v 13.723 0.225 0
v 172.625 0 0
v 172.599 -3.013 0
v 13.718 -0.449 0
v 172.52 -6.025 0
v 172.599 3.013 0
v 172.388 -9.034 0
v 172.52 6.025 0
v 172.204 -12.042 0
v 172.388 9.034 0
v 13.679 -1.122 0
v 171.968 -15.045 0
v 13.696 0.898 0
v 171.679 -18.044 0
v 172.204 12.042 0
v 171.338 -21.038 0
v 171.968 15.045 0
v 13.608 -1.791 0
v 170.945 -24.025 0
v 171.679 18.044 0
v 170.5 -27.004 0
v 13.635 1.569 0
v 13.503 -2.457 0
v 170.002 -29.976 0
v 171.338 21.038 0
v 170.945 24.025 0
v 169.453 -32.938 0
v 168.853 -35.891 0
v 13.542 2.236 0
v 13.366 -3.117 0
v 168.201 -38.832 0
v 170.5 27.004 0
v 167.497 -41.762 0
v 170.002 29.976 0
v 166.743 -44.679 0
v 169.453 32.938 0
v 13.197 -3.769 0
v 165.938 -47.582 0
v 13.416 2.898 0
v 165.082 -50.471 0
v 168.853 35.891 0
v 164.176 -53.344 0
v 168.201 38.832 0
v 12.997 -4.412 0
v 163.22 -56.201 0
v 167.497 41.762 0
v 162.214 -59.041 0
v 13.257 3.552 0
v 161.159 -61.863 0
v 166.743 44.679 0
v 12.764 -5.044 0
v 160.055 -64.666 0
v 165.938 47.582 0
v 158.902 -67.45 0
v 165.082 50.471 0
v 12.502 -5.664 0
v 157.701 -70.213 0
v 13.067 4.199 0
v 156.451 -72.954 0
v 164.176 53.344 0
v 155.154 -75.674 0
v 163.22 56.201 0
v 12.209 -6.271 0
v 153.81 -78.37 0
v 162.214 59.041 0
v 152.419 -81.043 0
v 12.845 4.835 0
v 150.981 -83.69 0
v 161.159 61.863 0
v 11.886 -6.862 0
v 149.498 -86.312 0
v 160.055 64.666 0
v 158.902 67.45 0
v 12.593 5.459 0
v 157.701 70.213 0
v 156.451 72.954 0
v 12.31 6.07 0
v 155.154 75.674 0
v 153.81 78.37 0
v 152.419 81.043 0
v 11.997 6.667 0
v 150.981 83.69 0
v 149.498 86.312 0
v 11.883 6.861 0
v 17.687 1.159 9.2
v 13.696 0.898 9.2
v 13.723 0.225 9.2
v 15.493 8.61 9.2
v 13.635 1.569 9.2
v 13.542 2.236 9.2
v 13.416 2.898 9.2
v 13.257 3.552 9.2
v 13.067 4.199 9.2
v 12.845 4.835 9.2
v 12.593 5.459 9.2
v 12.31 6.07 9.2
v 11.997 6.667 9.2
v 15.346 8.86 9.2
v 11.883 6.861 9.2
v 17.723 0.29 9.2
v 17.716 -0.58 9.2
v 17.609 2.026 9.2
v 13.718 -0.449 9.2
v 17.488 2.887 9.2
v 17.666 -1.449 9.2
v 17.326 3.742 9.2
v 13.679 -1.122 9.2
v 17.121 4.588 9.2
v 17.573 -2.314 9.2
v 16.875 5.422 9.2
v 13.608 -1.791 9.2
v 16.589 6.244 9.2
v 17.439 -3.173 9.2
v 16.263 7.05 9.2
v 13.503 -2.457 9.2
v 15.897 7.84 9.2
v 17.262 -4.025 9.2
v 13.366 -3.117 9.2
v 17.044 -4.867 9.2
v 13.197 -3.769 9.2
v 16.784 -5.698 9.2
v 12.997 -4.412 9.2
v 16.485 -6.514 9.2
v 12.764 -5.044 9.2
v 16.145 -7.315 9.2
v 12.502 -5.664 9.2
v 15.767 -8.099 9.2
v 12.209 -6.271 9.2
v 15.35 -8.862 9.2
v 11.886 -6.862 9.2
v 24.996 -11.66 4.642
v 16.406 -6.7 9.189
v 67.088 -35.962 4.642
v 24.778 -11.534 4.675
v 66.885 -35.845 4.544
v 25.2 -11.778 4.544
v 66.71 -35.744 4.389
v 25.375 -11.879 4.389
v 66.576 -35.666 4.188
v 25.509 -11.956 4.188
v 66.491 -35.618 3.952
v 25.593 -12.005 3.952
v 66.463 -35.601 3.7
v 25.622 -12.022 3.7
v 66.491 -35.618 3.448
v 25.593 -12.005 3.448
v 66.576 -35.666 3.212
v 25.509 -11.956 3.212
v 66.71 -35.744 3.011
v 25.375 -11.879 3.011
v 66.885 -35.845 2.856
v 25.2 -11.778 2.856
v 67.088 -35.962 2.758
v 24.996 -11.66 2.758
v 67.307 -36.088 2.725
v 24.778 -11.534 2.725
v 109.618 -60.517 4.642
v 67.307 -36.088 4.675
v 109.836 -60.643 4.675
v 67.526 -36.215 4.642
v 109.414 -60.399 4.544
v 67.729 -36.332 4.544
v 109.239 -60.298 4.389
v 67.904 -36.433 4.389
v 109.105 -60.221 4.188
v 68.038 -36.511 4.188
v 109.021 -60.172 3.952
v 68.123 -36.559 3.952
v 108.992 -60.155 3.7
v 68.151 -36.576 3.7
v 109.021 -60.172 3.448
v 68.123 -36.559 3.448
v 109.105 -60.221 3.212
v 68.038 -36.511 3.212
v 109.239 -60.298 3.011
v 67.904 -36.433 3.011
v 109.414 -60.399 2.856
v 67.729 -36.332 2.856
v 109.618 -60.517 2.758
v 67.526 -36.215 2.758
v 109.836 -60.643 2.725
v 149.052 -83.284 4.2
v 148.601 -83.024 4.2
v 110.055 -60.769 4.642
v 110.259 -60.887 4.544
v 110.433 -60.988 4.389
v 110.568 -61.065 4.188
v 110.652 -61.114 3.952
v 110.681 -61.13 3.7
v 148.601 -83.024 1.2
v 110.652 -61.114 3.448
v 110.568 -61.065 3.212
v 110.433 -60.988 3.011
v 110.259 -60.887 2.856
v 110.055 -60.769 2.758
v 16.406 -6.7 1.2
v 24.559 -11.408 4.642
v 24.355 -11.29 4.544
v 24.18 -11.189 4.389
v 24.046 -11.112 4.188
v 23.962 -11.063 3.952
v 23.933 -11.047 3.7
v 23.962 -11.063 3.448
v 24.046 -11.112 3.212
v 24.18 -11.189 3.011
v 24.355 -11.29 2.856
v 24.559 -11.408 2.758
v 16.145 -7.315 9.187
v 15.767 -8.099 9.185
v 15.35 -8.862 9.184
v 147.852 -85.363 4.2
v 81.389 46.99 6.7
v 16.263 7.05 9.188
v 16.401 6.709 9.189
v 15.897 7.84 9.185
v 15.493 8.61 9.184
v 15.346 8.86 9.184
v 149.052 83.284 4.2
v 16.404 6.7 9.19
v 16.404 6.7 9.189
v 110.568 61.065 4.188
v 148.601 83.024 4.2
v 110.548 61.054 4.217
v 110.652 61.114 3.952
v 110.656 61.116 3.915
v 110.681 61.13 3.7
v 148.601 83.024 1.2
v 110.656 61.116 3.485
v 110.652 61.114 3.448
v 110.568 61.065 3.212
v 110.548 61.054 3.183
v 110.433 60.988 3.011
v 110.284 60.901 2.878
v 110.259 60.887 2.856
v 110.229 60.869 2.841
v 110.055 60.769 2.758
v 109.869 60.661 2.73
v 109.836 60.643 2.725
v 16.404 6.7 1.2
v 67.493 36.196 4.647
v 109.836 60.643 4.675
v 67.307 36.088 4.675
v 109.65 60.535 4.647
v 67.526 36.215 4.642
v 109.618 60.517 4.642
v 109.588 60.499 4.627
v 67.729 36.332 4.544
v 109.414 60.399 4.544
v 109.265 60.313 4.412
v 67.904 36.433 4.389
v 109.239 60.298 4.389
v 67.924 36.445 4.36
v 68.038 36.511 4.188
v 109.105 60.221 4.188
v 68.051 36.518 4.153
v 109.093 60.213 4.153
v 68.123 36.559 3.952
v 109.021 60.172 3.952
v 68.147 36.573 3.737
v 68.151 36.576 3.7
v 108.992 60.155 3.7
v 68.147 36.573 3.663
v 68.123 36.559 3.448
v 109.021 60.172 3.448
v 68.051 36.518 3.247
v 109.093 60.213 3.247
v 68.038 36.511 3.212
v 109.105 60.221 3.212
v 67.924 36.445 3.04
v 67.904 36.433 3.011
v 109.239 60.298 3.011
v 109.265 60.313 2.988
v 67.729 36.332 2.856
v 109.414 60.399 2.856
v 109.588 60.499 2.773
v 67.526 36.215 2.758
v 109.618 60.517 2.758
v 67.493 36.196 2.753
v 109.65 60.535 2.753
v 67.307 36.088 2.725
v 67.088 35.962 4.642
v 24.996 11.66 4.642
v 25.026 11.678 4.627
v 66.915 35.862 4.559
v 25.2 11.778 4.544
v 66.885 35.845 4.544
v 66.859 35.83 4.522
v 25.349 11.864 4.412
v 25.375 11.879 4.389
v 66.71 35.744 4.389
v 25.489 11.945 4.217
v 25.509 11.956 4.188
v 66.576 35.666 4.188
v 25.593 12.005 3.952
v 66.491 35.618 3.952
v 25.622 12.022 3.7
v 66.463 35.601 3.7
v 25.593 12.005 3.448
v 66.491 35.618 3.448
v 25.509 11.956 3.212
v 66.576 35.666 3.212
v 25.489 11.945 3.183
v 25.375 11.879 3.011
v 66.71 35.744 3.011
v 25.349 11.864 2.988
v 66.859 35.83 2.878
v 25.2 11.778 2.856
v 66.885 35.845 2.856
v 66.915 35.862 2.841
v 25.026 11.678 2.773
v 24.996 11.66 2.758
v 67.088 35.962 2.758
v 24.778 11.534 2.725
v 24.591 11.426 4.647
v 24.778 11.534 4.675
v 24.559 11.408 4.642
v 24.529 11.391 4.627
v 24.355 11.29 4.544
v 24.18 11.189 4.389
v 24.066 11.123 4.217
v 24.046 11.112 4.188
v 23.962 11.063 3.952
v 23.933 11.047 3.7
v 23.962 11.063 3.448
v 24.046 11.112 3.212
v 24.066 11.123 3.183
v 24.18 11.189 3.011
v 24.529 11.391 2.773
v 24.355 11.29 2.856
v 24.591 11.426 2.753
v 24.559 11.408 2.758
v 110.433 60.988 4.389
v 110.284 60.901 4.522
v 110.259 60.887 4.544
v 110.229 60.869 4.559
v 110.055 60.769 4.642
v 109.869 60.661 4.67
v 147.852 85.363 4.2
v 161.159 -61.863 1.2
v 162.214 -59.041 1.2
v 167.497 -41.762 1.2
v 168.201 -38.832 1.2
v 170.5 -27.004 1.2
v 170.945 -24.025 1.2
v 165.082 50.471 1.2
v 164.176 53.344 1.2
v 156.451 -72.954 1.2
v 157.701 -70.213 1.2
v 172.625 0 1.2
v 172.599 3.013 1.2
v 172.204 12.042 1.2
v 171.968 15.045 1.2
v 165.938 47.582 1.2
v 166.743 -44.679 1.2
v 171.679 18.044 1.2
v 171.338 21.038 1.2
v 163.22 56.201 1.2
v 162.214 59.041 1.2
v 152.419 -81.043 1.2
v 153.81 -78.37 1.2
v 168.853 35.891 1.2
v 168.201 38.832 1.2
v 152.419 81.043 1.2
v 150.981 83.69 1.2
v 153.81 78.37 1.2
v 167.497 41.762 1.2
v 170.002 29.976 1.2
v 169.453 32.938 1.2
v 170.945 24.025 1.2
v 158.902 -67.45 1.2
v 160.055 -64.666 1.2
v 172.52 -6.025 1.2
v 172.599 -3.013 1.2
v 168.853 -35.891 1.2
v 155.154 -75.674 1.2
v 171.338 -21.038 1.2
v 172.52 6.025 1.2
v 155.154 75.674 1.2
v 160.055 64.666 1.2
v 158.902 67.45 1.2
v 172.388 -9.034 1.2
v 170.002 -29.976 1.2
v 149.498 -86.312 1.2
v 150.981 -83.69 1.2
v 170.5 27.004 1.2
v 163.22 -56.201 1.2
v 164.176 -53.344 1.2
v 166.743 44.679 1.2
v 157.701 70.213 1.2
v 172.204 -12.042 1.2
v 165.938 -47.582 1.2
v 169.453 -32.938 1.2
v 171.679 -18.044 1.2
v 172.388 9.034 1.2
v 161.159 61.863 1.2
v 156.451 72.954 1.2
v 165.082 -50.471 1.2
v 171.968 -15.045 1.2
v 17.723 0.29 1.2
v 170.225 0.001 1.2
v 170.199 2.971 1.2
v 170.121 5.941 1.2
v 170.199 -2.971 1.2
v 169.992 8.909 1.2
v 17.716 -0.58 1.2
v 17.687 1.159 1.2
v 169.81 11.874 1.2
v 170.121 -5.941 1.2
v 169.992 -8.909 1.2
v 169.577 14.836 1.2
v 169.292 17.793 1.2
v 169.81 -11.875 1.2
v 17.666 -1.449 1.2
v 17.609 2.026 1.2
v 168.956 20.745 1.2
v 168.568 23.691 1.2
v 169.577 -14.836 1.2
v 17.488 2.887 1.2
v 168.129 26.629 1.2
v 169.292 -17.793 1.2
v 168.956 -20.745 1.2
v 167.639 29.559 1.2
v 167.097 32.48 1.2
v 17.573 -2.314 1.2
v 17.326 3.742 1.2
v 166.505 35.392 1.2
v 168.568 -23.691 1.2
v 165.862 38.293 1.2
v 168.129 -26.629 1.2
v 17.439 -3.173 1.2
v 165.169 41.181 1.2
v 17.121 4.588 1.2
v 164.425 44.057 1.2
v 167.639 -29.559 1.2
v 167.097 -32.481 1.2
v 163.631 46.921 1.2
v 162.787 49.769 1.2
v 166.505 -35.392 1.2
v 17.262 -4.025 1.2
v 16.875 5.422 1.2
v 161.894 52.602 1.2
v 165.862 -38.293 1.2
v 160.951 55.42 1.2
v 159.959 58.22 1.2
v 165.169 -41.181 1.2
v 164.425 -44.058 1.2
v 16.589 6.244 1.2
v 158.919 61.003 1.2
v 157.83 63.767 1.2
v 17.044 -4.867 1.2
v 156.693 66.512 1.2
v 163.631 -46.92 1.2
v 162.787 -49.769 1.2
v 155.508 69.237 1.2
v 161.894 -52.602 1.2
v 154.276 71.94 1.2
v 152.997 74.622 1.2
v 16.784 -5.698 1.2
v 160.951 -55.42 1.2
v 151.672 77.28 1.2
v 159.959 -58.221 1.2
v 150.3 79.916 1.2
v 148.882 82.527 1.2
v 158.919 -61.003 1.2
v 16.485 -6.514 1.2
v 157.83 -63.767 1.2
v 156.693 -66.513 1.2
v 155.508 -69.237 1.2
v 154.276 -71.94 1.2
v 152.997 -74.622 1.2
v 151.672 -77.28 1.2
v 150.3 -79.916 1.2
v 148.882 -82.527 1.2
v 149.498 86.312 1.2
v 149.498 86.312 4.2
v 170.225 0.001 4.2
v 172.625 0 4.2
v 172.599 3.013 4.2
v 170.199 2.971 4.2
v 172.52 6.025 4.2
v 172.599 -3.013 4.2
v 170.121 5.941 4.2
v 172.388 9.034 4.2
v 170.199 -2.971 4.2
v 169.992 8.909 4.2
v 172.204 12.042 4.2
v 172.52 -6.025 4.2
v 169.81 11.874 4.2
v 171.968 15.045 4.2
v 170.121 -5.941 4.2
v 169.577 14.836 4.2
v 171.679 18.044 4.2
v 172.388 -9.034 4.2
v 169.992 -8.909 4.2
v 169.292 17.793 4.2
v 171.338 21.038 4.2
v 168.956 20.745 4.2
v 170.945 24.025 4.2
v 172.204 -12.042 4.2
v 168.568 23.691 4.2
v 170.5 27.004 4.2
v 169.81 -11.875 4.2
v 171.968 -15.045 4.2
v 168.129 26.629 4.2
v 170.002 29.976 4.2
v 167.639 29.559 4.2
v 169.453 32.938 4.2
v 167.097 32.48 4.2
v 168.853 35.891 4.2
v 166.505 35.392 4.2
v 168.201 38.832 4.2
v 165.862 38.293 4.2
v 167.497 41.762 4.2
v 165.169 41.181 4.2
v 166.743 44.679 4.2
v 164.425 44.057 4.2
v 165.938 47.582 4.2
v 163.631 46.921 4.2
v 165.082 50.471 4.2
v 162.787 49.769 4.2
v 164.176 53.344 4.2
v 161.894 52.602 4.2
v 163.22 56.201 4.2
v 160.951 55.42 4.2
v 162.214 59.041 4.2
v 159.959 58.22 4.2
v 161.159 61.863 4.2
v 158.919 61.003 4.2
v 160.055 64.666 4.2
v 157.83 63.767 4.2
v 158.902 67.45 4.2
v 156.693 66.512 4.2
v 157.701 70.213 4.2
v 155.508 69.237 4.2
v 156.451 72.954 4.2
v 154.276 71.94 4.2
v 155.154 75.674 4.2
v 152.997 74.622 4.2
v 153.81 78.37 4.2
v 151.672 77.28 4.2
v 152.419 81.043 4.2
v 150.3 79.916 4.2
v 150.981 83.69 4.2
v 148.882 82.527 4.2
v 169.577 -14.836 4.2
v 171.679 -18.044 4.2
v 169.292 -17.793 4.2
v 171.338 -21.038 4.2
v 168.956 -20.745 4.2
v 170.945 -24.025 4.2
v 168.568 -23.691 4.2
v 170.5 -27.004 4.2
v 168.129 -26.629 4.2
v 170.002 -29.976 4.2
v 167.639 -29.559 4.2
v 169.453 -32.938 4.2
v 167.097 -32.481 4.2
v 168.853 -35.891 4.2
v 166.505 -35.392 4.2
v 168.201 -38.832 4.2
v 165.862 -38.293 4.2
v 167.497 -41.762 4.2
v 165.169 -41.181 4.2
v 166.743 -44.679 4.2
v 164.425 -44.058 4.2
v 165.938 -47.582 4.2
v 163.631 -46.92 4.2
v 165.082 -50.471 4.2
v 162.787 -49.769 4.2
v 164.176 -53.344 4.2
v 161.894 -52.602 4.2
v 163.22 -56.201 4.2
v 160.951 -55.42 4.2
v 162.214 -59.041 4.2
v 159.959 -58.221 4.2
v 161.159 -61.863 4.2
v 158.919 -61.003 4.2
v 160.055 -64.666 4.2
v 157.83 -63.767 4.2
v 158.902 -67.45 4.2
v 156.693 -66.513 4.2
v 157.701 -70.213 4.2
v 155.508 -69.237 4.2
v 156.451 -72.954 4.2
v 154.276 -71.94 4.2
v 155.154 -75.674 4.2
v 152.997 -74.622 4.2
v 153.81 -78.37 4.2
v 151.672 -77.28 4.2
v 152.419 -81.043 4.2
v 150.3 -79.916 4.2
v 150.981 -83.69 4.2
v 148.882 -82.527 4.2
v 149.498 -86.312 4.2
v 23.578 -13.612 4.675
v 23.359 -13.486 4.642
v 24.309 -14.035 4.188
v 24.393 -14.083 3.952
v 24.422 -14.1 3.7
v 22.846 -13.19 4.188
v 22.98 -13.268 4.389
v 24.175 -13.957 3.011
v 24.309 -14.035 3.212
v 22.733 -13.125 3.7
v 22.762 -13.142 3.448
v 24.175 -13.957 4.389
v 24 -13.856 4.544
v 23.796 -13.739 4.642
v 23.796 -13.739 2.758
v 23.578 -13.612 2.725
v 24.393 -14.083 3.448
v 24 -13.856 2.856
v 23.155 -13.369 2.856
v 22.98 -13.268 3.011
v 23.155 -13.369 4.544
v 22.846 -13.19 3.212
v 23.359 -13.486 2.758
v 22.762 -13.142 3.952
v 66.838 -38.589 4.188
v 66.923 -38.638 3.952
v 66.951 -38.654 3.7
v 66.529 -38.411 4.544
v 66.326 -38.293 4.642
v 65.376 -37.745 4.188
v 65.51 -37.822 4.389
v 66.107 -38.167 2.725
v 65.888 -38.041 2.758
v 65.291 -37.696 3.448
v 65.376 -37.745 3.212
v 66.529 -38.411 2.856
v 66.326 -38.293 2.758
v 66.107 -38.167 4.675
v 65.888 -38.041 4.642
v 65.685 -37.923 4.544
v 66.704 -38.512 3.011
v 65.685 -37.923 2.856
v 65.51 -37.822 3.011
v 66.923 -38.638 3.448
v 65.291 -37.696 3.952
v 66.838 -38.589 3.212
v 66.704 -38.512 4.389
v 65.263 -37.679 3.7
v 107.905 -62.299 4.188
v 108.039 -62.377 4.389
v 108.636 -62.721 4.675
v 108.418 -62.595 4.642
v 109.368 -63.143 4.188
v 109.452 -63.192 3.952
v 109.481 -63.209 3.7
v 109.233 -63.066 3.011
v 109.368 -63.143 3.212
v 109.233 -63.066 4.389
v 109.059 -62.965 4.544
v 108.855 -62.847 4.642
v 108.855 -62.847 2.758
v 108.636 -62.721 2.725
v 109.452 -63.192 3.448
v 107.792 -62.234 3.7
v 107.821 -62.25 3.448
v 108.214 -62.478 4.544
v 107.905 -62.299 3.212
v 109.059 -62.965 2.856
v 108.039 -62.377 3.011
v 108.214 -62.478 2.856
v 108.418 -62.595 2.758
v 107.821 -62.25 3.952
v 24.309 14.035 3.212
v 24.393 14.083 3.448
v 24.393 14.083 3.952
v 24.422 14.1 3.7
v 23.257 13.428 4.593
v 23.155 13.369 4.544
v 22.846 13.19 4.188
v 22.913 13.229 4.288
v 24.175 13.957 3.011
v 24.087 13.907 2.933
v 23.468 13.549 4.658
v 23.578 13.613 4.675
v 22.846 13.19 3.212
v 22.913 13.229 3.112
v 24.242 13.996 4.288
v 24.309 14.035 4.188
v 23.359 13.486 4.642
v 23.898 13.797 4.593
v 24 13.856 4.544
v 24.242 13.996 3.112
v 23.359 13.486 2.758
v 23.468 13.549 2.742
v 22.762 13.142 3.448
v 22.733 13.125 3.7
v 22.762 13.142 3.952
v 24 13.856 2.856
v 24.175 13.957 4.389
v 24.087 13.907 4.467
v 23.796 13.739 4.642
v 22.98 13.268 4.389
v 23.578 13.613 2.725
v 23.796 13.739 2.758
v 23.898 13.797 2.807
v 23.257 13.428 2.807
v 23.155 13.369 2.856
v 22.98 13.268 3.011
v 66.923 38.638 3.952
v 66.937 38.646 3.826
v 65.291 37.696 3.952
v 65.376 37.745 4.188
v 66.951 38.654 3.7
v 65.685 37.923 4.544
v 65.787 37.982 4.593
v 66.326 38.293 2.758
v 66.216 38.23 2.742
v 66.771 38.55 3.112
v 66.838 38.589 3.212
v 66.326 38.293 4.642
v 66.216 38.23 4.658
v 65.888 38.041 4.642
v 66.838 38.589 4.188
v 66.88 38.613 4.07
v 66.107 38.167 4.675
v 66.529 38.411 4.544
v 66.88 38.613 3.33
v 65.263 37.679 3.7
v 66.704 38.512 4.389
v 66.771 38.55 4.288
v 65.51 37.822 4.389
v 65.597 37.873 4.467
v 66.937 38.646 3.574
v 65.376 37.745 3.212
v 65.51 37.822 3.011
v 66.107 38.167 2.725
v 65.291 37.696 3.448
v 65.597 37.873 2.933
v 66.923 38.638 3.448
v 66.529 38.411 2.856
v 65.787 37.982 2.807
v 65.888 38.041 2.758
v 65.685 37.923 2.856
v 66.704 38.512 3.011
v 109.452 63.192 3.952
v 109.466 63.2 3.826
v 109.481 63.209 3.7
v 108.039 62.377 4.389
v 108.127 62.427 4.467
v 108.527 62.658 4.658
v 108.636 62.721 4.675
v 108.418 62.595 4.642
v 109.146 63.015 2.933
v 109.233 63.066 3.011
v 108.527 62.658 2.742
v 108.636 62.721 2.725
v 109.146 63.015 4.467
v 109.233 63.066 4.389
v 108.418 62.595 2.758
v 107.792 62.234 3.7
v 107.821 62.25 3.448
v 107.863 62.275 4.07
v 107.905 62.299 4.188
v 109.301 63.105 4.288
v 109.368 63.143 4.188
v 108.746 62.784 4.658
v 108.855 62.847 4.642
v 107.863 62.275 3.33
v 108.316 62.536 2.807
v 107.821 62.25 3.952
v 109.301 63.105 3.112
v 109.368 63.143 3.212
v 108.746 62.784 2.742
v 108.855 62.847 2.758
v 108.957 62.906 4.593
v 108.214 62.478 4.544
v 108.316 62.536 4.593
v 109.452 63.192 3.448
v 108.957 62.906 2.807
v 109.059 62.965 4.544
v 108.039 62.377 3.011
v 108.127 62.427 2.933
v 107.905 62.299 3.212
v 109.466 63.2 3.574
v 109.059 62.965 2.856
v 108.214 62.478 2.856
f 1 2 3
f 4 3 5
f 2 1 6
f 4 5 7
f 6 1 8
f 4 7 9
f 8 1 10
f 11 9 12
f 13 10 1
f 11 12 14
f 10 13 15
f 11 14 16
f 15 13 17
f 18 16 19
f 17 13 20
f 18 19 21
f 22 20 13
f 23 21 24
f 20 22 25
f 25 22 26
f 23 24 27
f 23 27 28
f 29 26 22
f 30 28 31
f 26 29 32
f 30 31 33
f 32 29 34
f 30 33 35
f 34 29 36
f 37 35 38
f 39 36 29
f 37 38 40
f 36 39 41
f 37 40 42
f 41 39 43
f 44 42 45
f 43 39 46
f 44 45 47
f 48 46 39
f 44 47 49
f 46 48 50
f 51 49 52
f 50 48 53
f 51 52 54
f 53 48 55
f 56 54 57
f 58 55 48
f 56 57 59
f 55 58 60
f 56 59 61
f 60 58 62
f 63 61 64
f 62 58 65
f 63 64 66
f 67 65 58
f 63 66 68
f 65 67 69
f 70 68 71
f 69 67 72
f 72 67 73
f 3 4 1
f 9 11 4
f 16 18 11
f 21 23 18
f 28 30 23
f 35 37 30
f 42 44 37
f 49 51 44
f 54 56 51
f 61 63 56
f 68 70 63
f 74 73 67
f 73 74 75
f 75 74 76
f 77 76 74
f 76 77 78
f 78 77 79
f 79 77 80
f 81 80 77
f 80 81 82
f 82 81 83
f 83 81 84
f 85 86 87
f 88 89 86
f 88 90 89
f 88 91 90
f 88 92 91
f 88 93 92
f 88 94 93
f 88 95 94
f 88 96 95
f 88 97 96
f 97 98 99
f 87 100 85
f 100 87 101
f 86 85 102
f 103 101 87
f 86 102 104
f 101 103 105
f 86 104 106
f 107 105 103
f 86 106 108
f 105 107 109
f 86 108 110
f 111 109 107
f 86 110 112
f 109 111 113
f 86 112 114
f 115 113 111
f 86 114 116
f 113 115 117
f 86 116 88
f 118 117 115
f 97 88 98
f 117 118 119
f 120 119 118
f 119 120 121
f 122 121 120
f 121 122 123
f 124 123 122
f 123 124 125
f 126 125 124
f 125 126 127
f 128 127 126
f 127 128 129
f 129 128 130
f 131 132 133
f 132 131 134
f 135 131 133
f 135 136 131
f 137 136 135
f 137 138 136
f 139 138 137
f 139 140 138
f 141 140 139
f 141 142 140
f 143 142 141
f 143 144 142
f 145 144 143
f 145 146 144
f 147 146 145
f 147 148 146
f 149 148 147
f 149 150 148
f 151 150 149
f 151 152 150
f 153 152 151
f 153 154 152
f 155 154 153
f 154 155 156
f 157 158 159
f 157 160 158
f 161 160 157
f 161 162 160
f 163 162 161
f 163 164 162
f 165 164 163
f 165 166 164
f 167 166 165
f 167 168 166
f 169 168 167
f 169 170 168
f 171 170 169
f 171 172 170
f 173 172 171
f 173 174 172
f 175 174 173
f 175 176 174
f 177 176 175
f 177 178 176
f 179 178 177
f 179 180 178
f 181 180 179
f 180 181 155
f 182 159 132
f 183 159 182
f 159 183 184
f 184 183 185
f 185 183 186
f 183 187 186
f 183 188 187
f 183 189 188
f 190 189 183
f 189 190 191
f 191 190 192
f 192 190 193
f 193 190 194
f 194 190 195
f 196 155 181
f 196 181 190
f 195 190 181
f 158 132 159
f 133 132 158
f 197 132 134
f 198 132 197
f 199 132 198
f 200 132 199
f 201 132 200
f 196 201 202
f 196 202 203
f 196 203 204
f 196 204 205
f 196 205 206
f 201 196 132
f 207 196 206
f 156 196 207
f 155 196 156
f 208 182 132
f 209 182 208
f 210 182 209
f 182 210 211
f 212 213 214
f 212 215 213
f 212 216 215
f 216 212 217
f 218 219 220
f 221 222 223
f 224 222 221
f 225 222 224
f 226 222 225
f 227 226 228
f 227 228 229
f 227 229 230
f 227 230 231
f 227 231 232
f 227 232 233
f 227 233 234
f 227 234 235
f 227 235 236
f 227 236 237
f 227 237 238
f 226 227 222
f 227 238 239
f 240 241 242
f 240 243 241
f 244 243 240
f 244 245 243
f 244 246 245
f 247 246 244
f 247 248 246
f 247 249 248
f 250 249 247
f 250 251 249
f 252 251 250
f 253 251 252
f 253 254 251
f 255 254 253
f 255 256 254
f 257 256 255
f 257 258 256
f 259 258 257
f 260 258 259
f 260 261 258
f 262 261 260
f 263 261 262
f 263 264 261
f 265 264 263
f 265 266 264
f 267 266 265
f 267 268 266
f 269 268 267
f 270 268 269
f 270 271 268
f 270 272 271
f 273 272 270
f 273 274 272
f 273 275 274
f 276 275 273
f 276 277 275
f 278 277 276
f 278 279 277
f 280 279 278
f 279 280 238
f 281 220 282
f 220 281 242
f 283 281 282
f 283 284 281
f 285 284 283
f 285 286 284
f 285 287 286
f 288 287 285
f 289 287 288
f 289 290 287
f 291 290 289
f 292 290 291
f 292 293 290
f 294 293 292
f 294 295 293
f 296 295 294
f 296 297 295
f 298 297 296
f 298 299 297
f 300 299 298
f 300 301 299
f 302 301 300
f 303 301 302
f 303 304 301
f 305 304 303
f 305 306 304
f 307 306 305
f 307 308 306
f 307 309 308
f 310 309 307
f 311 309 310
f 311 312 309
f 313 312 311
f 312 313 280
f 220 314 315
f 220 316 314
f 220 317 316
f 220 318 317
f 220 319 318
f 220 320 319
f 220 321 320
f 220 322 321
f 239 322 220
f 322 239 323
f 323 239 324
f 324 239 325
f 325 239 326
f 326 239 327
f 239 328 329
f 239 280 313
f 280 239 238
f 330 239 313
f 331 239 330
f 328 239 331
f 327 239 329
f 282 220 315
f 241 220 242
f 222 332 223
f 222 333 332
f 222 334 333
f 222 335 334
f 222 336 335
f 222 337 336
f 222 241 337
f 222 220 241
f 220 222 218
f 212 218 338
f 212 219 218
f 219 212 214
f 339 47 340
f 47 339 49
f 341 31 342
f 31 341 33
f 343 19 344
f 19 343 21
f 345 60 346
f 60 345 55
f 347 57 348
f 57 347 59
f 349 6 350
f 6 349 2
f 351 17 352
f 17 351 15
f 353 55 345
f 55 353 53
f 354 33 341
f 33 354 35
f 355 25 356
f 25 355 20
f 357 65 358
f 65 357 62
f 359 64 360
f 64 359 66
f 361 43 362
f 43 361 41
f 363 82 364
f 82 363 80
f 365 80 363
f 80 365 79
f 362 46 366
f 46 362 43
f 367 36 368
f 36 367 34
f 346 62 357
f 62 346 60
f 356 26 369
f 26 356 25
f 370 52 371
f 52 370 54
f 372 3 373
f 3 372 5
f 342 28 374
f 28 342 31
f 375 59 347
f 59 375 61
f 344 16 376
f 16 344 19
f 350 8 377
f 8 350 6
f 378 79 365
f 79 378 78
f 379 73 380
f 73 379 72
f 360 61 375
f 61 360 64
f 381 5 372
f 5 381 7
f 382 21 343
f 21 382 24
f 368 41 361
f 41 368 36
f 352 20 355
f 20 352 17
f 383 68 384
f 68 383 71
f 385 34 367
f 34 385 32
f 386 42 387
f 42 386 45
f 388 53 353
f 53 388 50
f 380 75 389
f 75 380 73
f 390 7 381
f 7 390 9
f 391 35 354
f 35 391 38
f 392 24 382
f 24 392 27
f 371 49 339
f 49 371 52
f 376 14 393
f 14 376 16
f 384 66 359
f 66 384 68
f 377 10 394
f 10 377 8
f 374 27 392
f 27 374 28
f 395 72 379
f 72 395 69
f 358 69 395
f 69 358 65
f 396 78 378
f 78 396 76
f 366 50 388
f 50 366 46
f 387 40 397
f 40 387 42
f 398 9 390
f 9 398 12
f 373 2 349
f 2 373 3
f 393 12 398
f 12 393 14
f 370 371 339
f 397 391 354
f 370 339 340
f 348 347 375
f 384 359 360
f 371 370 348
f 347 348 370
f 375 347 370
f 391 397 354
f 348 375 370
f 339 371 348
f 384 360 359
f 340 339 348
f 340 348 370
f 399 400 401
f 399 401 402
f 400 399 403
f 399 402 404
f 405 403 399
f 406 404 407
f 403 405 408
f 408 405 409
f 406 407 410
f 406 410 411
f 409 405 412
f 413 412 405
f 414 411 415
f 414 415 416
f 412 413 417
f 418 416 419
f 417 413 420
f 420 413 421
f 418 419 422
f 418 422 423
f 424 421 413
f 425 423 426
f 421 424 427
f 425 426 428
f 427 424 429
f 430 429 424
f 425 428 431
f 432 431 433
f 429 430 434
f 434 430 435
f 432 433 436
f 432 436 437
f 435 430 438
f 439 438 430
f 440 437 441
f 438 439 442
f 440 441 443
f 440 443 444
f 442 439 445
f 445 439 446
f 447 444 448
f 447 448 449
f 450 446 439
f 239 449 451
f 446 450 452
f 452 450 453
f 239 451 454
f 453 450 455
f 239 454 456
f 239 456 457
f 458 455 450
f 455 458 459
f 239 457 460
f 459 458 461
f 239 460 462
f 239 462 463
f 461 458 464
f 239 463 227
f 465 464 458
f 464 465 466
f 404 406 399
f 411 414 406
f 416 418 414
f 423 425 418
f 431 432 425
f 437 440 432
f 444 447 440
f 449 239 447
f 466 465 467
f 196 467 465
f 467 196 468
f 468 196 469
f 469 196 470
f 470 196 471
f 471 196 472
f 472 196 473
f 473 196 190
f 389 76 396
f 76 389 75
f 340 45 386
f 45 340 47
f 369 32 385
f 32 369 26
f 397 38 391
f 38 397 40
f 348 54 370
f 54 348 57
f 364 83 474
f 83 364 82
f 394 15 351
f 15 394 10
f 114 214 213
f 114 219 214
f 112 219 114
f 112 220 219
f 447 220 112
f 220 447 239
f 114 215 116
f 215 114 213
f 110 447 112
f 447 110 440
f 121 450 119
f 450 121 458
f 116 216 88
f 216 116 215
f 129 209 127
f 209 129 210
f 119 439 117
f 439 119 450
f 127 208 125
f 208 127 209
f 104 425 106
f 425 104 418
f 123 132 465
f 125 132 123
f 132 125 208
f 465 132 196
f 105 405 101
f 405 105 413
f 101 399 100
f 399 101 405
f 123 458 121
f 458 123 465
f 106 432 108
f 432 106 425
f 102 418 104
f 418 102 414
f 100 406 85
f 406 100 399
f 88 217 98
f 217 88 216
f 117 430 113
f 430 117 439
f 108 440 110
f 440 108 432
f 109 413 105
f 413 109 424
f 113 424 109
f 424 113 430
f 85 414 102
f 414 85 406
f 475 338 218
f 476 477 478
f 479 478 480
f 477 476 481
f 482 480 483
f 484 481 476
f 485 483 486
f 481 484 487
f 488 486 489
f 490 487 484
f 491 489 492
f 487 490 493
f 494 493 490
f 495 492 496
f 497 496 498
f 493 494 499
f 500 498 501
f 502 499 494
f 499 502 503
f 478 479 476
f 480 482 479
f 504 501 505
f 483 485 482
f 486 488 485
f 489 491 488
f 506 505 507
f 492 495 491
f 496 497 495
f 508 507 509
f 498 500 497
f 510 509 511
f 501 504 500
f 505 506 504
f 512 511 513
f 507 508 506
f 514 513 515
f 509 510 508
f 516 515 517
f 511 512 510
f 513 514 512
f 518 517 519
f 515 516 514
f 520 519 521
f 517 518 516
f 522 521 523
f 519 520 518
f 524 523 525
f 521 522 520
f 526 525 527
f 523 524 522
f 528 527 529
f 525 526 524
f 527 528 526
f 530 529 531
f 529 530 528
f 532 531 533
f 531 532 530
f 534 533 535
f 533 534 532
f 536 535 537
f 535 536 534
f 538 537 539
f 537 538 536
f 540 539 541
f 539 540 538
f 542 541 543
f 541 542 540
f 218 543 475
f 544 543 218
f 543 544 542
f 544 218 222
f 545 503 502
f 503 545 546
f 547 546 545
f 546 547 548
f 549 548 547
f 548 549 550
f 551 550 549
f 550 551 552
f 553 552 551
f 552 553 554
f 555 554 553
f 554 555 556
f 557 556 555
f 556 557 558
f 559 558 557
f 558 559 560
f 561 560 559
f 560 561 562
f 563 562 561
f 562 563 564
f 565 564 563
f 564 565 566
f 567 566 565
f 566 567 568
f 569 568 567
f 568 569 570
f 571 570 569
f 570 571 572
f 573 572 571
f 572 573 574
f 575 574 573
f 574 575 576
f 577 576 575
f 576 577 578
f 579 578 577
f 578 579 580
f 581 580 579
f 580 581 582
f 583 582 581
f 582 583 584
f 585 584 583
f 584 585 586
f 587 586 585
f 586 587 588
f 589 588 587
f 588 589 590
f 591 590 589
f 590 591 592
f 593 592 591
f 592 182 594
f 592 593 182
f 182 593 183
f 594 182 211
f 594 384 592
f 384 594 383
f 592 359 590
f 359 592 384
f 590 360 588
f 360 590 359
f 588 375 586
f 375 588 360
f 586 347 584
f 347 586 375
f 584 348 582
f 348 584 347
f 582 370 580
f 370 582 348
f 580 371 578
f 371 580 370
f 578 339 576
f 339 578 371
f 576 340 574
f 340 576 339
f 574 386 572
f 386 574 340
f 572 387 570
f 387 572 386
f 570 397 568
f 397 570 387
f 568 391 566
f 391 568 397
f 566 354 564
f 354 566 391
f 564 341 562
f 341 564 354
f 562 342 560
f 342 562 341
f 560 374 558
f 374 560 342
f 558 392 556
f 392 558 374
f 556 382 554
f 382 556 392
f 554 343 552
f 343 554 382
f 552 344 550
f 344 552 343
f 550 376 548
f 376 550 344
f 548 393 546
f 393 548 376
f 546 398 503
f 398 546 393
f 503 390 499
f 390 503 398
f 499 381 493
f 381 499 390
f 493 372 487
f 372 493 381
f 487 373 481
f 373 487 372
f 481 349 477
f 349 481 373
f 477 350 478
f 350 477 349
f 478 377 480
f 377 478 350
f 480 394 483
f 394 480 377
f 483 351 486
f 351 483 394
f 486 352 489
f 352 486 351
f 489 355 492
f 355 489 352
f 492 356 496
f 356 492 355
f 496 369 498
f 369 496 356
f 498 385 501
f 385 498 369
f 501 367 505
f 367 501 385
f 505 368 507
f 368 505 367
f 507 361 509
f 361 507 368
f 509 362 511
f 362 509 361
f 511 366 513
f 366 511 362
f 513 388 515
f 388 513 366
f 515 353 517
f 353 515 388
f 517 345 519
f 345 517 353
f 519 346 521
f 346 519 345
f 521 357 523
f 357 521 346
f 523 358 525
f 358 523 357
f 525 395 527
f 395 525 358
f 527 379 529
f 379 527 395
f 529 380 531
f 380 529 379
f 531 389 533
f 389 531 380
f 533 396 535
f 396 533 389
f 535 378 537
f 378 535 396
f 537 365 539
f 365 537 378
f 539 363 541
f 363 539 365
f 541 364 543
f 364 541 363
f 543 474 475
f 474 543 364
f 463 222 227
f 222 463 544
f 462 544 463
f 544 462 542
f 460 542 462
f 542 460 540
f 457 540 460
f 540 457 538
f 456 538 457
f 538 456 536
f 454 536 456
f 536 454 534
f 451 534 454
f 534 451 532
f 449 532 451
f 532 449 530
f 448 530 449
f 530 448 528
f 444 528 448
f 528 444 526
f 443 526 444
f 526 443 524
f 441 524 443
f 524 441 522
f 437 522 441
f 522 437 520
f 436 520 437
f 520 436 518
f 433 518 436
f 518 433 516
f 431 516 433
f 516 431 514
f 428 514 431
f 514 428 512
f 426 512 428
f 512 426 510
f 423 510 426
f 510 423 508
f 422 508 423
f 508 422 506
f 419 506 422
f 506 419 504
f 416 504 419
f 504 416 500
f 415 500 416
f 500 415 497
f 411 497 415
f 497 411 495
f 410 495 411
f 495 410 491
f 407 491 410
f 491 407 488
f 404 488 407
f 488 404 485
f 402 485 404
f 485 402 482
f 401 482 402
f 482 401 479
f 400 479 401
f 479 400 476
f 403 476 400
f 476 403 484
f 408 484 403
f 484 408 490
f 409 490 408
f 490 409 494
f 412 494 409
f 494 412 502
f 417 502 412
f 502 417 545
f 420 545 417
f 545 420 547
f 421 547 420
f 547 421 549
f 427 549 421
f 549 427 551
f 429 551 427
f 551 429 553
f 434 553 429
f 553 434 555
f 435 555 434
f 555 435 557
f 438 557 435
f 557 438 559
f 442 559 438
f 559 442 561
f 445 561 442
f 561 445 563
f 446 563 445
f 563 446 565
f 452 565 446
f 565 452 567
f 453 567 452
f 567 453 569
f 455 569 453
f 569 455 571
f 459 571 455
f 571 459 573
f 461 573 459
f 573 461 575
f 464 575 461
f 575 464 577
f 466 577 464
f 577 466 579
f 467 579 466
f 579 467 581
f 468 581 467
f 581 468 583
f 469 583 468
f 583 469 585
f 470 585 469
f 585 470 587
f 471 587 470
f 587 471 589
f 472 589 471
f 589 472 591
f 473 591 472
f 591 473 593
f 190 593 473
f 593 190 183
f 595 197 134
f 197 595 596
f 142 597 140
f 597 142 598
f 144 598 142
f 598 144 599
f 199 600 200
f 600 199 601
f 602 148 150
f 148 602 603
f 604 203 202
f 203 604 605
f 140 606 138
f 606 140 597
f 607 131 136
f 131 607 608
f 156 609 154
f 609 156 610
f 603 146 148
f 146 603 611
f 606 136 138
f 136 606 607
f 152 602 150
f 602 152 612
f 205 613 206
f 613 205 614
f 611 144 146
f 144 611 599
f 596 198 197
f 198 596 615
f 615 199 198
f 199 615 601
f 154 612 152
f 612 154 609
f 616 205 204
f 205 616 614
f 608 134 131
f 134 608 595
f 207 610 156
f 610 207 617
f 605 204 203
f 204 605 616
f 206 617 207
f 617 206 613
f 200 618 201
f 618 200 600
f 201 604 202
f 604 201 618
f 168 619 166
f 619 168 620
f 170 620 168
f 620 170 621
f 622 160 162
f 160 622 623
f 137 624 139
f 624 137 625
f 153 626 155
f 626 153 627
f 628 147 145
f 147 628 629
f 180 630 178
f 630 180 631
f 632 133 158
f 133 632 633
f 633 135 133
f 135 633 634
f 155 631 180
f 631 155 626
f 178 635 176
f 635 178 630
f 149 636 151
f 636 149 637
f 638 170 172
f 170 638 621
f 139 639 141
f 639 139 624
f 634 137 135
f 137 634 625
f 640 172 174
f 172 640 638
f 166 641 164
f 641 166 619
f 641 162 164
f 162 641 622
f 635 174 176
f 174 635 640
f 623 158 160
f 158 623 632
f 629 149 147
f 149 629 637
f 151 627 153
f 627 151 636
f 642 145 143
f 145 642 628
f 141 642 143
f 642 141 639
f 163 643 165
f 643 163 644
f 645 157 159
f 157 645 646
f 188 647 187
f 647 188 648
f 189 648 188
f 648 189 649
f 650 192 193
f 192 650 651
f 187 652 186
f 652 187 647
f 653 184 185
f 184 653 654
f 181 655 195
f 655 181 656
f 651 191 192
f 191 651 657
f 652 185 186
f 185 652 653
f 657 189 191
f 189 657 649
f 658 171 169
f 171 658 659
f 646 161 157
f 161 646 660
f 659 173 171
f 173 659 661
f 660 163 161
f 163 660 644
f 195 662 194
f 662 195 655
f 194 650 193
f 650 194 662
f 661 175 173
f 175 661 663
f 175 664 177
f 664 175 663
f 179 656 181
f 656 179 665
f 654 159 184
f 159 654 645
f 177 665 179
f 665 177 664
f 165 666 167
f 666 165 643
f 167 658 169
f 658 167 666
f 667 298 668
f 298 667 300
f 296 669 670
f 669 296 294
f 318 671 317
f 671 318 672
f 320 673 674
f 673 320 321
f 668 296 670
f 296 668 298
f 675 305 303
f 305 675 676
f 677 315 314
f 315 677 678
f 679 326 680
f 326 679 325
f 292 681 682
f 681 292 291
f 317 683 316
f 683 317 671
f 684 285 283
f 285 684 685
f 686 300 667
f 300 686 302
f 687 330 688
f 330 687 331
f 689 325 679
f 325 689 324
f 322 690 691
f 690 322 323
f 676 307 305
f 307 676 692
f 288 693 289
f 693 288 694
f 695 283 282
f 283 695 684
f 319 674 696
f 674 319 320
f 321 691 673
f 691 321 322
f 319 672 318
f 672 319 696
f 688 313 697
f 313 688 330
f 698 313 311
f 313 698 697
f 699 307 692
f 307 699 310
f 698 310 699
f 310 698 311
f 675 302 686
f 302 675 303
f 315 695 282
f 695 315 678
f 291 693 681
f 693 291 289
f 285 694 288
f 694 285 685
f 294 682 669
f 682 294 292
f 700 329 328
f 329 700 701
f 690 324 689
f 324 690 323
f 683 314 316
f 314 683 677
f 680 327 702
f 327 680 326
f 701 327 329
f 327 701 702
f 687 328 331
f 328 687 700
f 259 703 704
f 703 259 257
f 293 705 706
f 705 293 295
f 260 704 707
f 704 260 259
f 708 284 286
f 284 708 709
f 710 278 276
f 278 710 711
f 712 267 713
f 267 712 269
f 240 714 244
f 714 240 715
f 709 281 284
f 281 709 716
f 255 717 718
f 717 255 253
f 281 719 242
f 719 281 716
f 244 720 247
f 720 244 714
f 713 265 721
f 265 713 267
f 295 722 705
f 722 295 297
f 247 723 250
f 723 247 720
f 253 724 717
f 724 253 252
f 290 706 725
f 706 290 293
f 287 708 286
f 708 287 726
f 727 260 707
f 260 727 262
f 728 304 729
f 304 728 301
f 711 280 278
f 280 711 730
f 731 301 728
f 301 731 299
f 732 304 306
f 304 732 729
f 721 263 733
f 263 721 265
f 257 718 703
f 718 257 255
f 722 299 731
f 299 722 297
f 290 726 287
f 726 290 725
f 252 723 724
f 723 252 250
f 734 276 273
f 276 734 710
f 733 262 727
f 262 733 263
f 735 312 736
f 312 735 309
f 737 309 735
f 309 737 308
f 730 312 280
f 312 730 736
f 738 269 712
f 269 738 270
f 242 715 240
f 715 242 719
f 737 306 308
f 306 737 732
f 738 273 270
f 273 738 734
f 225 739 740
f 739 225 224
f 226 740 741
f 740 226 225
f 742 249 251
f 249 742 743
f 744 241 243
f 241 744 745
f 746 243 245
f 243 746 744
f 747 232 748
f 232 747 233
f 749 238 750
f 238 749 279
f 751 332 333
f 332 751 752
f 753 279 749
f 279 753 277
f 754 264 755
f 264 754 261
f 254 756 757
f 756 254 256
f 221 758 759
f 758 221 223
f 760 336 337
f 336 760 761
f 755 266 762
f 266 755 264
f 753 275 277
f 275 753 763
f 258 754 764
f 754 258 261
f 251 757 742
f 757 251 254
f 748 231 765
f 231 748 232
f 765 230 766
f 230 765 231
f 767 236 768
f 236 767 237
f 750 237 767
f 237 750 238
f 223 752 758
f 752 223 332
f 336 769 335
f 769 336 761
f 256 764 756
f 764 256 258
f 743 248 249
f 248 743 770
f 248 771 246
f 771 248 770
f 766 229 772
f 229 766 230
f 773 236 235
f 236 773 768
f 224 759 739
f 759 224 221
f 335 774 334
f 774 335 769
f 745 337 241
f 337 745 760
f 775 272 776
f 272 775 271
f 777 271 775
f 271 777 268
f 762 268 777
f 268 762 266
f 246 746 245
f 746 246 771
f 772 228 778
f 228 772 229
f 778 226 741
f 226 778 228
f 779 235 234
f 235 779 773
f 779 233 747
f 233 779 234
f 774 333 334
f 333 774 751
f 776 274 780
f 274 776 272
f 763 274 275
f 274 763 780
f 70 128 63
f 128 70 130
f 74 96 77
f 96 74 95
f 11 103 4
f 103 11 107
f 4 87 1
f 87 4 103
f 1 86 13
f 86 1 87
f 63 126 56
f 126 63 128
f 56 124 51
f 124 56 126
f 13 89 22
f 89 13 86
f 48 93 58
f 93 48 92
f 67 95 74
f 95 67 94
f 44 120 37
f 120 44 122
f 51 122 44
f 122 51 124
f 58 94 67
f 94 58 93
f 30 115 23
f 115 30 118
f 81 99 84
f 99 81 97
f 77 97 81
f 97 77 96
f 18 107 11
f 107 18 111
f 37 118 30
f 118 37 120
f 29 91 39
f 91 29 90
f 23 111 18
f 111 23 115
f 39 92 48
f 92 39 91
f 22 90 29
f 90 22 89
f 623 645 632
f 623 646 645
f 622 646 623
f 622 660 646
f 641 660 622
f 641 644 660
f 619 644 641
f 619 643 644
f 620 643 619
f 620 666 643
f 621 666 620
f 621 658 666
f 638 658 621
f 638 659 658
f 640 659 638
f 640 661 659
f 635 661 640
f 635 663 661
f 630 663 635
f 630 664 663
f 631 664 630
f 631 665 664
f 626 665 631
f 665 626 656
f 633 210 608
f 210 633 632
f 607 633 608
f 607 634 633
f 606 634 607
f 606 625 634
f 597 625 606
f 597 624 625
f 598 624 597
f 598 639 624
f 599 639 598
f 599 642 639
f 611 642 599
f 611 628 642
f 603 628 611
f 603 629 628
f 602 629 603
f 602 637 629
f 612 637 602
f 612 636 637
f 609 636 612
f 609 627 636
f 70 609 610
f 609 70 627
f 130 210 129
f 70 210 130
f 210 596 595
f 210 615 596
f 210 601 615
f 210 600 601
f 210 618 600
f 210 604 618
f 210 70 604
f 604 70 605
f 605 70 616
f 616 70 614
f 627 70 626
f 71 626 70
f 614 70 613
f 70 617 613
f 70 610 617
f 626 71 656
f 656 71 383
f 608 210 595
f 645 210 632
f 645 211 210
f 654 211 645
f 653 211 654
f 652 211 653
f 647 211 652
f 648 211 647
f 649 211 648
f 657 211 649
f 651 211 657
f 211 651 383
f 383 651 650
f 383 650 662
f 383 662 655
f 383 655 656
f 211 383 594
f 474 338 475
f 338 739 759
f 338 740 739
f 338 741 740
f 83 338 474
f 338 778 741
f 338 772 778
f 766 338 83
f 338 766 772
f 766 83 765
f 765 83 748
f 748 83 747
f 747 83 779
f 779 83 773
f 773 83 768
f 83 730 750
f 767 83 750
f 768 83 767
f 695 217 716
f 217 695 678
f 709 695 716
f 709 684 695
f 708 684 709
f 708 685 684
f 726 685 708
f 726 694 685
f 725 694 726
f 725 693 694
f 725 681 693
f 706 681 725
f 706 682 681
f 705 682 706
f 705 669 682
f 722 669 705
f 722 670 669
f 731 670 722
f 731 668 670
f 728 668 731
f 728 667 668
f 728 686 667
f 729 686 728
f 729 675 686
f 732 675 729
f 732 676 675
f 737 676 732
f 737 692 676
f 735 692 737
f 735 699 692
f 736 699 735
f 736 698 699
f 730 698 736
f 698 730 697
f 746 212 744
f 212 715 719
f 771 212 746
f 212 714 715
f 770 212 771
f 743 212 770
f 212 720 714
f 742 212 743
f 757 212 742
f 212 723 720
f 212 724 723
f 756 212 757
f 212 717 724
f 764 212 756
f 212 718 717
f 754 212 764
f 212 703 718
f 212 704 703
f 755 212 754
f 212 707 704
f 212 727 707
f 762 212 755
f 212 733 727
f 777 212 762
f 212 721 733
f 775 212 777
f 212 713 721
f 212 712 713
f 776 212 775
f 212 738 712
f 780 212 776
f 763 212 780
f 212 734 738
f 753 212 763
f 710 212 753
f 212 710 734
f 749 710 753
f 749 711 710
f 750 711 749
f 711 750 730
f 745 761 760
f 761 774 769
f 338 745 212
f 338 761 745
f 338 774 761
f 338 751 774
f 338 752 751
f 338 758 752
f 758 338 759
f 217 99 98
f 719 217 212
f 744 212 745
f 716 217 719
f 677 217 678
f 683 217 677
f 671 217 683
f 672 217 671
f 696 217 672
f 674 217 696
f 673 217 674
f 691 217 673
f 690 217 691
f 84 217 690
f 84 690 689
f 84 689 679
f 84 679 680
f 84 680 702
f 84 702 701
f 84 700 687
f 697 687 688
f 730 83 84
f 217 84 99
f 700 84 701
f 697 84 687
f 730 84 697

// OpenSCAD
// file: params.scad
// Shared dimensions for the E27 pendant light diffuser.
// Both parts include this file so the disc's hole always matches the plug.
// All units are millimetres.

/* [E27 thread] */
// E27 (Edison) thread: IEC 60061-1 nominal male dimensions.
e27_major_d = 26.45;     // outside diameter of thread crests
e27_minor_d = 24.26;     // diameter at thread roots
e27_pitch   = 25.4 / 7;  // 7 threads per inch = 3.629 mm
// Shrink the thread slightly so a printed part turns freely in a metal shell.
thread_clearance = 0.3;  // subtracted from the diameter
thread_length    = 20;   // length of threaded section
lead_in          = 1.5;  // chamfer at the flat end to help start the thread

/* [Plug body] */
hollow        = true;    // hollow out the plug to save material
wall          = 2.4;     // wall thickness when hollow
end_cap       = 2.0;     // solid thickness of the flat end

/* [Collar (the ledge the disc sits on)] */
collar_d      = 36;      // must be larger than disc_hole_d
collar_h      = 3;       // flat part of the collar
collar_chamfer = 3;      // 45° underside chamfer so it prints without supports

/* [Grip] */
grip_d        = 32;
grip_h        = 14;
grip_flutes   = 12;      // number of finger scallops
grip_flute_d  = 6;

/* [Splitter and bulbs] */
// Designed for a DiCUNO 7-in-1 splitter: the plug screws into the centre
// socket (pointing down), and the six gooseneck arms are bent so their BR30
// bulbs point up above the disc. The arms bend, so measure your setup.
br30_d          = 95.25; // BR30 = 30/8" = 3.75" across the face
bulb_ring_r     = 110;   // distance from the splitter's axis to each bulb's centre
                         // (six BR30s touch at 95.25; leave a little air)
cover_margin    = 15;    // extra disc beyond the bulbs' outer edge, so they stay
                         // hidden when seen from an angle below

/* [Disc] */
disc_d          = 2 * (bulb_ring_r + br30_d / 2 + cover_margin);
disc_t          = 1.2;   // very thin so light passes through
disc_hole_clearance = 1.0;
disc_hole_d     = e27_major_d + disc_hole_clearance;
spokes          = 6;
spoke_w         = 2.4;   // a seam rib is two of these, one on each segment
spoke_h_inner   = 8;     // rib height at the hub (above the disc)
spoke_h_outer   = 3;     // rib height at the rim
hub_w           = 4;     // width of the reinforcing ring around the hole
rim_w           = 2.4;   // width of the reinforcing ring at the edge (0 = none)
rim_h           = 3;

/* [Hexagon] */
// The hexagon's corners point at the bulbs, so it needs less area than a
// circle to hide them. Size it so each bulb (plus margin) fits inside the
// two edges beside its corner.
hex_apothem     = bulb_ring_r * cos(30) + br30_d / 2 + cover_margin;
hex_r           = hex_apothem / cos(30);   // centre-to-corner radius

/* [Segmenting] */
// The disc is too big for most printers, so it's printed as identical wedges
// joined along the ribs. Segments must divide evenly into spokes.
segments        = 6;
pin_d           = 1.75;  // 1.75 mm filament works as alignment pins
pin_hole_d      = 1.95;
pin_count       = 3;     // pins per seam
bed_size        = 220;   // warn if a segment won't fit a square bed this size

$fn = 128;
// file: diffuser_lib.scad
// Shared geometry for the diffuser, in two shapes: "circle" and "hex".
//
// A thin plate with radial ribs on one side for stiffness. The hole lets the
// plug's thread pass through; the plate rests on the plug's collar.
// Print flat side down, ribs up. When hanging, the ribs face up toward the bulbs.
//
// The hexagon's corners sit at 0°, 60°, ... so the ribs run out to its corners.

include <params.scad>

hub_out_d = disc_hole_d + 2 * hub_w;
rib_r_in  = hub_out_d / 2 - 0.5;
pin_z     = disc_t + 2.5;

// Centre-to-farthest-point radius of each shape.
function outer_r(shape) = shape == "hex" ? hex_r : disc_d / 2;

// Where a rib meets the inside of the rim.
function rib_r_out(shape) =
    shape == "hex" ? hex_r - (rim_w > 0 ? rim_w / cos(30) - 0.5 : 0)
                   : disc_d / 2 - (rim_w > 0 ? rim_w - 0.5 : 0);

// Pins go only where the rib is tall enough to surround the hole.
function pin_radii(shape) =
    let (r_out = rib_r_out(shape),
         r_min = rib_r_in + 10,
         r_max = rib_r_in + (r_out - rib_r_in)
               * (spoke_h_inner - (pin_z - disc_t + pin_hole_d / 2 + 1))
               / (spoke_h_inner - spoke_h_outer))
    [for (i = [0 : pin_count - 1])
         r_min + (r_max - r_min) * i / max(pin_count - 1, 1)];

function is_seam(i) = segments > 1 && (i * segments) % spokes == 0;

module outline(shape) {
    if (shape == "hex") circle(r = hex_r, $fn = 6);
    else                circle(d = disc_d, $fn = 360);
}

module rib(w, r_out) {
    hull() {
        translate([rib_r_in, -w / 2, 0])
            cube([0.01, w, disc_t + spoke_h_inner]);
        translate([r_out - 0.01, -w / 2, 0])
            cube([0.01, w, disc_t + spoke_h_outer]);
    }
}

module diffuser(shape = "circle") {
    assert(shape == "circle" || shape == "hex", "shape must be \"circle\" or \"hex\"");
    assert(spokes % segments == 0, "segments must divide evenly into spokes");
    difference() {
        union() {
            linear_extrude(height = disc_t) outline(shape);
            cylinder(d = hub_out_d, h = disc_t + spoke_h_inner);
            if (rim_w > 0)
                linear_extrude(height = disc_t + rim_h)
                    difference() {
                        outline(shape);
                        offset(delta = -rim_w) outline(shape);
                    }
            for (i = [0 : spokes - 1])
                rotate([0, 0, i * 360 / spokes])
                    rib(is_seam(i) ? 2 * spoke_w : spoke_w, rib_r_out(shape));
        }
        translate([0, 0, -1])
            cylinder(d = disc_hole_d, h = disc_t + spoke_h_inner + 2);
        // Alignment pin holes straight through each seam rib.
        for (i = [0 : spokes - 1])
            if (is_seam(i))
                for (r = pin_radii(shape))
                    rotate([0, 0, i * 360 / spokes])
                        translate([r, 0, pin_z])
                            rotate([90, 0, 0])
                                cylinder(d = pin_hole_d, h = 2 * spoke_w + 2,
                                         center = true, $fn = 24);
    }
}

// One wedge, lying between angle 0 and 360/segments.
module diffuser_wedge(shape = "circle") {
    a = 360 / segments;
    big = 2 * outer_r(shape);
    intersection() {
        diffuser(shape);
        translate([0, 0, -1])
            linear_extrude(height = disc_t + spoke_h_inner + 2)
                polygon(concat([[0, 0]],
                               [for (t = [0 : a / 16 : a]) big * [cos(t), sin(t)]]));
    }
}

// A wedge turned to point along +X, with a size report and bed-fit warning.
module printable_wedge(shape = "circle") {
    r = outer_r(shape);
    a = 360 / segments;
    width = 2 * r * sin(min(a, 180) / 2);
    echo(str(shape, ": ", round(2 * r), " mm across; segment about ",
             round(r), " x ", round(width), " mm"));
    if (max(r, width) > bed_size)
        echo(str("WARNING: segment may not fit a ", bed_size,
                 " mm bed — increase segments"));
    rotate([0, 0, -a / 2]) diffuser_wedge(shape);
}
// main file
// One wedge of the round diffuser disc. Print `segments` copies (6 by default)
// and join them along the ribs with filament pins and glue.

use <diffuser_lib.scad>

printable_wedge("circle");
